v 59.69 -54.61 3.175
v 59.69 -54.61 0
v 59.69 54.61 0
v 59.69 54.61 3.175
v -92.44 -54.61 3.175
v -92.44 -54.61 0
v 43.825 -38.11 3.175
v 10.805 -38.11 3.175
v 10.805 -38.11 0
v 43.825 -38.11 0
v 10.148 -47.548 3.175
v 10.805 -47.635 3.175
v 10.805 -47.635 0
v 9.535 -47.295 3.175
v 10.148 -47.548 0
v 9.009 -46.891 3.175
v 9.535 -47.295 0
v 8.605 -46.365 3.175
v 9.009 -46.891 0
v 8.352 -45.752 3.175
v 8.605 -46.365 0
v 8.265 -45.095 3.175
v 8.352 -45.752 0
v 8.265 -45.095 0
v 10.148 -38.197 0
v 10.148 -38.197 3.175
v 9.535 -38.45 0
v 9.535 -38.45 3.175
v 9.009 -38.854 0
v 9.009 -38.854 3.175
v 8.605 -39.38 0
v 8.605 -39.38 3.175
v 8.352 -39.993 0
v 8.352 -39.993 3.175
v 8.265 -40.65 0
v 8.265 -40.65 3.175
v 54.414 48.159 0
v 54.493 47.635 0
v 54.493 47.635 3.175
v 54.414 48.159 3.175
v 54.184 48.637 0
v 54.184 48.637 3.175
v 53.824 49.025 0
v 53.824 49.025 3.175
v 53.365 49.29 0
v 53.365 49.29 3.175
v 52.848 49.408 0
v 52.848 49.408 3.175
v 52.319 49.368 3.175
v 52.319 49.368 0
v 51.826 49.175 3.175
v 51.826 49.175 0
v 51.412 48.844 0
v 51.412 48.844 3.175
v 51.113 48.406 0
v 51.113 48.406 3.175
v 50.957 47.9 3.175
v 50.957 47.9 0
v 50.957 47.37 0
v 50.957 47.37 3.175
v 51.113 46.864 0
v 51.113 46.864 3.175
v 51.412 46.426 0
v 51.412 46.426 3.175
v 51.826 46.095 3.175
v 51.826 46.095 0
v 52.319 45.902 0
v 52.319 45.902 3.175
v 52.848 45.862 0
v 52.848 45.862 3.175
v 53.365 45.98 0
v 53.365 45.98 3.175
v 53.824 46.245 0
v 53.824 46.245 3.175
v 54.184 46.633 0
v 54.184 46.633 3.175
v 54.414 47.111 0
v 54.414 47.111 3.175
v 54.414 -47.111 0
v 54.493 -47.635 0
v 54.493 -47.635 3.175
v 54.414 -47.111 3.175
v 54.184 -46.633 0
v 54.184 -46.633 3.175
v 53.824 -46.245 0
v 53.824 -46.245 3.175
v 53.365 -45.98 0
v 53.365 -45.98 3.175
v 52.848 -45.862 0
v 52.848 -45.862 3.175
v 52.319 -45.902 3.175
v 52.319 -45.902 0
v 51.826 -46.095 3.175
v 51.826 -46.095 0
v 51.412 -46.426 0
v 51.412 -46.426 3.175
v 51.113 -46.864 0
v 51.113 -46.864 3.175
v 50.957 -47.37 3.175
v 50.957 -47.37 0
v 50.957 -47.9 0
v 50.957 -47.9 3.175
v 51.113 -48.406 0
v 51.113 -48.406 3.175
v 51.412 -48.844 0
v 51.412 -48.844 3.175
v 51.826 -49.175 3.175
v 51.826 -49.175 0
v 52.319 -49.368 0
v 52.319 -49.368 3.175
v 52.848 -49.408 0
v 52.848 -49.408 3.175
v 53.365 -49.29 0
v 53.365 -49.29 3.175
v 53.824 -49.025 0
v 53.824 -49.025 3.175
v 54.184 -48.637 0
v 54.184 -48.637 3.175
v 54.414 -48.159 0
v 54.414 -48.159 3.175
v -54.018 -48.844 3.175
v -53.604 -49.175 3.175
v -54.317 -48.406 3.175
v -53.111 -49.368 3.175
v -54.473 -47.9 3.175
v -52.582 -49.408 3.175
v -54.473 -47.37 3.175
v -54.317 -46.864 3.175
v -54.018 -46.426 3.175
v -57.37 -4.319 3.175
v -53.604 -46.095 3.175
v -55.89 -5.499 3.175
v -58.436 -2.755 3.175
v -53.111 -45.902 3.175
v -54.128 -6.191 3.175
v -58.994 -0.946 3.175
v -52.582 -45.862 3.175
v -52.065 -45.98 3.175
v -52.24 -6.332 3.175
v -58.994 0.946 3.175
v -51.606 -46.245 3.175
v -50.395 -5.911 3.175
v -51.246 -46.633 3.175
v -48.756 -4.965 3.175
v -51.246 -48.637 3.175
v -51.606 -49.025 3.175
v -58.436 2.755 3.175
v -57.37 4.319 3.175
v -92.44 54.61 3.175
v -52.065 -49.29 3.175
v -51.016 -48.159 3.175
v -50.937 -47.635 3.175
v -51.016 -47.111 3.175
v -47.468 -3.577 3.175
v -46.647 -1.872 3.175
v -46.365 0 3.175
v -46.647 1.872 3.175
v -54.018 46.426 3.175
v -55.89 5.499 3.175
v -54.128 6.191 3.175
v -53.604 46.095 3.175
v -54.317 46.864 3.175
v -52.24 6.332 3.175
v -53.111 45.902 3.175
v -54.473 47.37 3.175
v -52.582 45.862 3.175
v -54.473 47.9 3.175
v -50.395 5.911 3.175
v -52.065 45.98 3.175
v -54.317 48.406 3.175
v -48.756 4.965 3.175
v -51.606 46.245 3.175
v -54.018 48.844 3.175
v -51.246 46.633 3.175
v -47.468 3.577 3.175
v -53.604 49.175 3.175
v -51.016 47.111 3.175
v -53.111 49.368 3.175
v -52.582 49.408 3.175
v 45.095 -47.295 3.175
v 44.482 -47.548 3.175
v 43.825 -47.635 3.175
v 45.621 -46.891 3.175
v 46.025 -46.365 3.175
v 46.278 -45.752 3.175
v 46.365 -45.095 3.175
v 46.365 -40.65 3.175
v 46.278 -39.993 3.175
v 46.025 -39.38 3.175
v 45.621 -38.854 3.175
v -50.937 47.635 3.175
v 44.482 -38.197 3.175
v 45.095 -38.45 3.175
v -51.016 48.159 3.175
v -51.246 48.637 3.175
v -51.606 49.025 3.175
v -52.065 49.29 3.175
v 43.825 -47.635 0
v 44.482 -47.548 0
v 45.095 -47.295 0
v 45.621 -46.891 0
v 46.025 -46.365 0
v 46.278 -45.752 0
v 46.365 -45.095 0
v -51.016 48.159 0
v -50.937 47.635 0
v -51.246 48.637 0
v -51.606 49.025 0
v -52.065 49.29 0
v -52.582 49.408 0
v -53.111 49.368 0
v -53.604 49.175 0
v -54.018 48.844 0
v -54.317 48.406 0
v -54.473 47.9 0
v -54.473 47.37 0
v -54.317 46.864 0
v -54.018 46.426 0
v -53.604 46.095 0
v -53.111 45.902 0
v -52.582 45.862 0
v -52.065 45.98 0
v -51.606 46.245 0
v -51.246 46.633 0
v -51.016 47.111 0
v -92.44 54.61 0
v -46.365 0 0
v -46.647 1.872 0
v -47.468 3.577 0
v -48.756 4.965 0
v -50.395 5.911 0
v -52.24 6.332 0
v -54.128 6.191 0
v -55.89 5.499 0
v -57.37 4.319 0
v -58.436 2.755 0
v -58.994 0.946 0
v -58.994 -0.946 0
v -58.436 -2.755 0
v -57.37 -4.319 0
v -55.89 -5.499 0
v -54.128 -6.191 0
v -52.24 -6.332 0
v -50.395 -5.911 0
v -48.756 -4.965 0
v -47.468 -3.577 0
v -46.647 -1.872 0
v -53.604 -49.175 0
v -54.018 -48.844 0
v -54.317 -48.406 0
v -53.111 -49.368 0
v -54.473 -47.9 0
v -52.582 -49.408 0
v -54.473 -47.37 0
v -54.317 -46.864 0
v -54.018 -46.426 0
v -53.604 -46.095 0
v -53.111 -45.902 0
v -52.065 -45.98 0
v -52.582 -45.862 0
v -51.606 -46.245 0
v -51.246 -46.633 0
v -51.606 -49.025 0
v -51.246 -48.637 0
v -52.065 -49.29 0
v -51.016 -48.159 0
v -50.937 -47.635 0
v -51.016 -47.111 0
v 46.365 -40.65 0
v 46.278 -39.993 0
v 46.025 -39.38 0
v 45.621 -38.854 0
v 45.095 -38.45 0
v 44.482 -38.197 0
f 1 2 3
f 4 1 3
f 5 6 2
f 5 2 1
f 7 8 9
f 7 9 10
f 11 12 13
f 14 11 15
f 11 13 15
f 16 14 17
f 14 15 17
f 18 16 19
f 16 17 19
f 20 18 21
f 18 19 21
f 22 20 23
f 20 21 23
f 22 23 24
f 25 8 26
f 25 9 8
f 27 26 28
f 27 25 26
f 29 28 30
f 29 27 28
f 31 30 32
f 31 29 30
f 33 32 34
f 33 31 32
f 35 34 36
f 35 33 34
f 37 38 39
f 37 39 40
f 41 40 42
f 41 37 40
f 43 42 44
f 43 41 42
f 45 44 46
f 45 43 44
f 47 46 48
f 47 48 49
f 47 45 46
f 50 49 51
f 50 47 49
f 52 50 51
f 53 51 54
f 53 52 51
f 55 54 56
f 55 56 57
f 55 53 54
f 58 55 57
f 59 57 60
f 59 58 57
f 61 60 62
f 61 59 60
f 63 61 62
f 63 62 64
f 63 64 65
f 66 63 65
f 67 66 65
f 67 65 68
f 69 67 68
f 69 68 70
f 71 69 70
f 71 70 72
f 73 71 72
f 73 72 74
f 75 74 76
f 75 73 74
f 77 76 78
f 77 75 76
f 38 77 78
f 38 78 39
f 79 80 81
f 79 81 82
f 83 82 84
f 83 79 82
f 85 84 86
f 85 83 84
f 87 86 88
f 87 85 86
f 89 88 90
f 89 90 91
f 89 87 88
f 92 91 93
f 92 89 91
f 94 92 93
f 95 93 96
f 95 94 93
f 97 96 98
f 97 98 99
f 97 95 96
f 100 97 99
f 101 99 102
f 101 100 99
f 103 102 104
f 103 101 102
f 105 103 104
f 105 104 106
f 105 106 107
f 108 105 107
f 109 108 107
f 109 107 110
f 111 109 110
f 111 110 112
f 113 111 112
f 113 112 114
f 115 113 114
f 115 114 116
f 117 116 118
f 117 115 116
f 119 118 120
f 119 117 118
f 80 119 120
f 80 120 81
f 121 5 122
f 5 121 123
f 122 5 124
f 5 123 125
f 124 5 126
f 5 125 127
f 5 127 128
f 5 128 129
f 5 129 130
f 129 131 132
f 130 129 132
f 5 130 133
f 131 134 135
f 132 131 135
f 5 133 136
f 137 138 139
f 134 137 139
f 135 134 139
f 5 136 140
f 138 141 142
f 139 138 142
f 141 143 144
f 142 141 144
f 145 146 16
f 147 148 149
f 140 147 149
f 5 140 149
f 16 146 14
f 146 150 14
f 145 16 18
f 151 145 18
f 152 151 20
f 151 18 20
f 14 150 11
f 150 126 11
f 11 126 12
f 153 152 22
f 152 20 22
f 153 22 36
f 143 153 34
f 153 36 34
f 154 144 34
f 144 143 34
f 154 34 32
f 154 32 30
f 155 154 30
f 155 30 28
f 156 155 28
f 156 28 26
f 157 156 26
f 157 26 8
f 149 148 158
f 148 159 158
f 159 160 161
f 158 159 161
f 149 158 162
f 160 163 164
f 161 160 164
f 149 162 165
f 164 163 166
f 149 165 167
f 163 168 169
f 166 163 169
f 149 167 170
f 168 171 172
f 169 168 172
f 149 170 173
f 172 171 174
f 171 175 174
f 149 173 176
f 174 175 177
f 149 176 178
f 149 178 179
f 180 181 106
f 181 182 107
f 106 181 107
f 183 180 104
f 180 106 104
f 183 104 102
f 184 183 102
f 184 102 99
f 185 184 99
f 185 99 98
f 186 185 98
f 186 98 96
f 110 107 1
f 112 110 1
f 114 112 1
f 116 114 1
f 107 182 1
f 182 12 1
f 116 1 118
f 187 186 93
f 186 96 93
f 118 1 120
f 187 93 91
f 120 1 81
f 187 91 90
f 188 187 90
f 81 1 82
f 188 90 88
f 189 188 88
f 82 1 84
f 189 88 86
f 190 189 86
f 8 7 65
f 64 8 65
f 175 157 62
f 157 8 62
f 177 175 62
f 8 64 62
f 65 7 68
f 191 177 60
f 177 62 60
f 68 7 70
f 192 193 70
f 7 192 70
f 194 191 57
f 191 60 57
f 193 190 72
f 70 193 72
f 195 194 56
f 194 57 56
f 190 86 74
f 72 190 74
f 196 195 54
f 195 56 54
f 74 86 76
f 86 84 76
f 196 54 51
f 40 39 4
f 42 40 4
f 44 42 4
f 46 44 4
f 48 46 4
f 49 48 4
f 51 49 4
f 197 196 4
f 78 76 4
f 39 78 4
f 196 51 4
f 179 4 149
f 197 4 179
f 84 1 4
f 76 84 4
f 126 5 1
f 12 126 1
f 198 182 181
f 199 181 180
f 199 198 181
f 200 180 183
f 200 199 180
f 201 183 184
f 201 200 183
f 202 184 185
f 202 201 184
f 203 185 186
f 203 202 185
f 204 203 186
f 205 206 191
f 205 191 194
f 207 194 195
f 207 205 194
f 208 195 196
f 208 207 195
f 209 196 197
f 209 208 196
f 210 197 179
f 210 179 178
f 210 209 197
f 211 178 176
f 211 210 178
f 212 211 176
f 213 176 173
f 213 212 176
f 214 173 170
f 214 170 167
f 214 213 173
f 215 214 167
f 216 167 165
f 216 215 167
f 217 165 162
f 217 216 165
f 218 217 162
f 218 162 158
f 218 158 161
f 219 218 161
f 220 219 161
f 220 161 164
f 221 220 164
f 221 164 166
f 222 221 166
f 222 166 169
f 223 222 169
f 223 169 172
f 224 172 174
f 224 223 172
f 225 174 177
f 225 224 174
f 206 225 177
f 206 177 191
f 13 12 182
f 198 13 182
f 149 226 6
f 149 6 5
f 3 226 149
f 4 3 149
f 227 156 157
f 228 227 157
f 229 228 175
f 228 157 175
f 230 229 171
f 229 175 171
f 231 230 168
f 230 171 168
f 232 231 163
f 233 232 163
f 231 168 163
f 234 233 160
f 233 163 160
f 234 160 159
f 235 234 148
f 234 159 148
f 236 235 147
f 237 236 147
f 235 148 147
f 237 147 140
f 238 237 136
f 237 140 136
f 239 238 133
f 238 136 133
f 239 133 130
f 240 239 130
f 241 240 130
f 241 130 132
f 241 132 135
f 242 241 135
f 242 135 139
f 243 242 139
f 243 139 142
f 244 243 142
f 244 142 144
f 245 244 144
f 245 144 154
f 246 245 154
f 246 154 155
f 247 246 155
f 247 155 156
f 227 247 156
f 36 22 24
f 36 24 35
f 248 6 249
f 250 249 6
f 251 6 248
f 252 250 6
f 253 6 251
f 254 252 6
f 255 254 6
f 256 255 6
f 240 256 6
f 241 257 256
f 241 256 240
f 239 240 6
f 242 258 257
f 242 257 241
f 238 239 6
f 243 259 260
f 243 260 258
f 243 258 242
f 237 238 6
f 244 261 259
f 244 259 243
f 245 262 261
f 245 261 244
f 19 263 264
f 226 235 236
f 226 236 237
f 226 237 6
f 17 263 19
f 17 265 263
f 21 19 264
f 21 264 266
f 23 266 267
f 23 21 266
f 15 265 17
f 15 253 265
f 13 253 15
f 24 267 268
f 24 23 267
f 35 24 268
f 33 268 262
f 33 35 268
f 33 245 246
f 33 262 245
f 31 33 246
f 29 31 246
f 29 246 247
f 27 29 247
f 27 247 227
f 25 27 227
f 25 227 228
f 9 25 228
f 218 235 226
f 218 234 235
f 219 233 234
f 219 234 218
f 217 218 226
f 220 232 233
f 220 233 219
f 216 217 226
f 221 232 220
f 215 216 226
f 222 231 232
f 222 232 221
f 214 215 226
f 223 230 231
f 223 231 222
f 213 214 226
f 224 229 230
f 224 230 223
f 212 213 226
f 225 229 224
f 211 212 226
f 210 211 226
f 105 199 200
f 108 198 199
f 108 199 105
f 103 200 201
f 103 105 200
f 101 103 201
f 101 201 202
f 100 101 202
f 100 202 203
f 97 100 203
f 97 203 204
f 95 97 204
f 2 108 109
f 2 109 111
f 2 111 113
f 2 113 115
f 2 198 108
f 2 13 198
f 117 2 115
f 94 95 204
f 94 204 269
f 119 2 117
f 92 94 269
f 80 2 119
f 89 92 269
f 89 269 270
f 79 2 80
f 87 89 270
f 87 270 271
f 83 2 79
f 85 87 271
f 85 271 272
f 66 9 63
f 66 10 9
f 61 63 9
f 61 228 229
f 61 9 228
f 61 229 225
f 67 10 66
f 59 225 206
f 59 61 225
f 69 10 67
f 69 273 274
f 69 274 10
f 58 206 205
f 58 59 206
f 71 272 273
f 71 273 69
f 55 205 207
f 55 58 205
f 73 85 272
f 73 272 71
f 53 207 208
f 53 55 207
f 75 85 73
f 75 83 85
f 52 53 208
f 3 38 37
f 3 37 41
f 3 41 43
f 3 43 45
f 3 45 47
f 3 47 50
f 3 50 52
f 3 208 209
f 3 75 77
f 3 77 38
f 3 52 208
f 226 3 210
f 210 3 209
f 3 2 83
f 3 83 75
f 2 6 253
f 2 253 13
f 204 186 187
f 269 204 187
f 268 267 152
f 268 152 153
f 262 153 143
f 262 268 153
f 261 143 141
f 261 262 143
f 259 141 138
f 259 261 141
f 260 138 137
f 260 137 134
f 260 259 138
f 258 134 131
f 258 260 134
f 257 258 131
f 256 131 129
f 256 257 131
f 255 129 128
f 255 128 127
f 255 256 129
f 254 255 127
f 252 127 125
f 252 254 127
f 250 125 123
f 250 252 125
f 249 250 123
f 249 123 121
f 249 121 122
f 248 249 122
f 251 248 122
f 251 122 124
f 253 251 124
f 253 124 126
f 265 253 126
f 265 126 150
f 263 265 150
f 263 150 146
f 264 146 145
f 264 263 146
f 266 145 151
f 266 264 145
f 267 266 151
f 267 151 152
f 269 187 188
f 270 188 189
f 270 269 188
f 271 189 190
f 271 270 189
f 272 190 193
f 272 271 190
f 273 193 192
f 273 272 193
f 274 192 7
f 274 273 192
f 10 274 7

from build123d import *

# Parameters (mm, degrees)
SKETCH1_R           = 1.778
BOSS_EXTRUDE1_DEPTH = 3.175
SKETCH2_W           = 38.1
SKETCH2_H           = 9.525
CUT_EXTRUDE1_DEPTH  = 105.692755002
FILLET1_R           = 2.54
SKETCH3_R           = 6.35
CUT_EXTRUDE2_DEPTH  = 105.692755002
SKETCH4_W           = 3.175
SKETCH4_H           = 109.22
BOSS_EXTRUDE2_DEPTH = 3.175


with BuildPart() as part:
    # Sketch1 → Boss-Extrude1 (new body)
    with BuildSketch(Plane.XY):
        Polygon((-89.265, -54.61), (59.69, -54.61), (59.69, 54.61), (-89.265, 54.61), (-89.265, 9.935), align=None)
        with Locations((-52.715, -47.635)):
            Circle(SKETCH1_R, mode=Mode.SUBTRACT)
        with Locations((52.715, -47.635)):
            Circle(SKETCH1_R, mode=Mode.SUBTRACT)
        with Locations((-52.715, 47.635)):
            Circle(SKETCH1_R, mode=Mode.SUBTRACT)
        with Locations((52.715, 47.635)):
            Circle(SKETCH1_R, mode=Mode.SUBTRACT)
    extrude(amount=BOSS_EXTRUDE1_DEPTH)

    # Sketch2 → Cut-Extrude1 (cut, through all)
    with BuildSketch(Plane.XY.offset(3.175)):
        with Locations((27.315, -42.8725)):
            Rectangle(SKETCH2_W, SKETCH2_H)
    extrude(amount=-CUT_EXTRUDE1_DEPTH, mode=Mode.SUBTRACT)

    # Fillet1
    fillet1_edges = [part.edges().sort_by_distance(p)[0] for p in [
        (46.365, -47.635, 1.5875),
        (8.265, -47.635, 1.5875),
        (8.265, -38.11, 1.5875),
        (46.365, -38.11, 1.5875),
    ]]
    fillet(fillet1_edges, radius=FILLET1_R)

    # Sketch3 → Cut-Extrude2 (cut, through all)
    with BuildSketch(Plane.XY.offset(3.175)):
        with Locations((-52.715, 0)):
            Circle(SKETCH3_R)
    extrude(amount=-CUT_EXTRUDE2_DEPTH, mode=Mode.SUBTRACT)

    # Sketch4 → Boss-Extrude2 (add)
    with BuildSketch(Plane.ZY.offset(89.265)):
        with Locations((1.5875, 0)):
            Rectangle(SKETCH4_W, SKETCH4_H)
    extrude(amount=BOSS_EXTRUDE2_DEPTH)


solid = part.part
